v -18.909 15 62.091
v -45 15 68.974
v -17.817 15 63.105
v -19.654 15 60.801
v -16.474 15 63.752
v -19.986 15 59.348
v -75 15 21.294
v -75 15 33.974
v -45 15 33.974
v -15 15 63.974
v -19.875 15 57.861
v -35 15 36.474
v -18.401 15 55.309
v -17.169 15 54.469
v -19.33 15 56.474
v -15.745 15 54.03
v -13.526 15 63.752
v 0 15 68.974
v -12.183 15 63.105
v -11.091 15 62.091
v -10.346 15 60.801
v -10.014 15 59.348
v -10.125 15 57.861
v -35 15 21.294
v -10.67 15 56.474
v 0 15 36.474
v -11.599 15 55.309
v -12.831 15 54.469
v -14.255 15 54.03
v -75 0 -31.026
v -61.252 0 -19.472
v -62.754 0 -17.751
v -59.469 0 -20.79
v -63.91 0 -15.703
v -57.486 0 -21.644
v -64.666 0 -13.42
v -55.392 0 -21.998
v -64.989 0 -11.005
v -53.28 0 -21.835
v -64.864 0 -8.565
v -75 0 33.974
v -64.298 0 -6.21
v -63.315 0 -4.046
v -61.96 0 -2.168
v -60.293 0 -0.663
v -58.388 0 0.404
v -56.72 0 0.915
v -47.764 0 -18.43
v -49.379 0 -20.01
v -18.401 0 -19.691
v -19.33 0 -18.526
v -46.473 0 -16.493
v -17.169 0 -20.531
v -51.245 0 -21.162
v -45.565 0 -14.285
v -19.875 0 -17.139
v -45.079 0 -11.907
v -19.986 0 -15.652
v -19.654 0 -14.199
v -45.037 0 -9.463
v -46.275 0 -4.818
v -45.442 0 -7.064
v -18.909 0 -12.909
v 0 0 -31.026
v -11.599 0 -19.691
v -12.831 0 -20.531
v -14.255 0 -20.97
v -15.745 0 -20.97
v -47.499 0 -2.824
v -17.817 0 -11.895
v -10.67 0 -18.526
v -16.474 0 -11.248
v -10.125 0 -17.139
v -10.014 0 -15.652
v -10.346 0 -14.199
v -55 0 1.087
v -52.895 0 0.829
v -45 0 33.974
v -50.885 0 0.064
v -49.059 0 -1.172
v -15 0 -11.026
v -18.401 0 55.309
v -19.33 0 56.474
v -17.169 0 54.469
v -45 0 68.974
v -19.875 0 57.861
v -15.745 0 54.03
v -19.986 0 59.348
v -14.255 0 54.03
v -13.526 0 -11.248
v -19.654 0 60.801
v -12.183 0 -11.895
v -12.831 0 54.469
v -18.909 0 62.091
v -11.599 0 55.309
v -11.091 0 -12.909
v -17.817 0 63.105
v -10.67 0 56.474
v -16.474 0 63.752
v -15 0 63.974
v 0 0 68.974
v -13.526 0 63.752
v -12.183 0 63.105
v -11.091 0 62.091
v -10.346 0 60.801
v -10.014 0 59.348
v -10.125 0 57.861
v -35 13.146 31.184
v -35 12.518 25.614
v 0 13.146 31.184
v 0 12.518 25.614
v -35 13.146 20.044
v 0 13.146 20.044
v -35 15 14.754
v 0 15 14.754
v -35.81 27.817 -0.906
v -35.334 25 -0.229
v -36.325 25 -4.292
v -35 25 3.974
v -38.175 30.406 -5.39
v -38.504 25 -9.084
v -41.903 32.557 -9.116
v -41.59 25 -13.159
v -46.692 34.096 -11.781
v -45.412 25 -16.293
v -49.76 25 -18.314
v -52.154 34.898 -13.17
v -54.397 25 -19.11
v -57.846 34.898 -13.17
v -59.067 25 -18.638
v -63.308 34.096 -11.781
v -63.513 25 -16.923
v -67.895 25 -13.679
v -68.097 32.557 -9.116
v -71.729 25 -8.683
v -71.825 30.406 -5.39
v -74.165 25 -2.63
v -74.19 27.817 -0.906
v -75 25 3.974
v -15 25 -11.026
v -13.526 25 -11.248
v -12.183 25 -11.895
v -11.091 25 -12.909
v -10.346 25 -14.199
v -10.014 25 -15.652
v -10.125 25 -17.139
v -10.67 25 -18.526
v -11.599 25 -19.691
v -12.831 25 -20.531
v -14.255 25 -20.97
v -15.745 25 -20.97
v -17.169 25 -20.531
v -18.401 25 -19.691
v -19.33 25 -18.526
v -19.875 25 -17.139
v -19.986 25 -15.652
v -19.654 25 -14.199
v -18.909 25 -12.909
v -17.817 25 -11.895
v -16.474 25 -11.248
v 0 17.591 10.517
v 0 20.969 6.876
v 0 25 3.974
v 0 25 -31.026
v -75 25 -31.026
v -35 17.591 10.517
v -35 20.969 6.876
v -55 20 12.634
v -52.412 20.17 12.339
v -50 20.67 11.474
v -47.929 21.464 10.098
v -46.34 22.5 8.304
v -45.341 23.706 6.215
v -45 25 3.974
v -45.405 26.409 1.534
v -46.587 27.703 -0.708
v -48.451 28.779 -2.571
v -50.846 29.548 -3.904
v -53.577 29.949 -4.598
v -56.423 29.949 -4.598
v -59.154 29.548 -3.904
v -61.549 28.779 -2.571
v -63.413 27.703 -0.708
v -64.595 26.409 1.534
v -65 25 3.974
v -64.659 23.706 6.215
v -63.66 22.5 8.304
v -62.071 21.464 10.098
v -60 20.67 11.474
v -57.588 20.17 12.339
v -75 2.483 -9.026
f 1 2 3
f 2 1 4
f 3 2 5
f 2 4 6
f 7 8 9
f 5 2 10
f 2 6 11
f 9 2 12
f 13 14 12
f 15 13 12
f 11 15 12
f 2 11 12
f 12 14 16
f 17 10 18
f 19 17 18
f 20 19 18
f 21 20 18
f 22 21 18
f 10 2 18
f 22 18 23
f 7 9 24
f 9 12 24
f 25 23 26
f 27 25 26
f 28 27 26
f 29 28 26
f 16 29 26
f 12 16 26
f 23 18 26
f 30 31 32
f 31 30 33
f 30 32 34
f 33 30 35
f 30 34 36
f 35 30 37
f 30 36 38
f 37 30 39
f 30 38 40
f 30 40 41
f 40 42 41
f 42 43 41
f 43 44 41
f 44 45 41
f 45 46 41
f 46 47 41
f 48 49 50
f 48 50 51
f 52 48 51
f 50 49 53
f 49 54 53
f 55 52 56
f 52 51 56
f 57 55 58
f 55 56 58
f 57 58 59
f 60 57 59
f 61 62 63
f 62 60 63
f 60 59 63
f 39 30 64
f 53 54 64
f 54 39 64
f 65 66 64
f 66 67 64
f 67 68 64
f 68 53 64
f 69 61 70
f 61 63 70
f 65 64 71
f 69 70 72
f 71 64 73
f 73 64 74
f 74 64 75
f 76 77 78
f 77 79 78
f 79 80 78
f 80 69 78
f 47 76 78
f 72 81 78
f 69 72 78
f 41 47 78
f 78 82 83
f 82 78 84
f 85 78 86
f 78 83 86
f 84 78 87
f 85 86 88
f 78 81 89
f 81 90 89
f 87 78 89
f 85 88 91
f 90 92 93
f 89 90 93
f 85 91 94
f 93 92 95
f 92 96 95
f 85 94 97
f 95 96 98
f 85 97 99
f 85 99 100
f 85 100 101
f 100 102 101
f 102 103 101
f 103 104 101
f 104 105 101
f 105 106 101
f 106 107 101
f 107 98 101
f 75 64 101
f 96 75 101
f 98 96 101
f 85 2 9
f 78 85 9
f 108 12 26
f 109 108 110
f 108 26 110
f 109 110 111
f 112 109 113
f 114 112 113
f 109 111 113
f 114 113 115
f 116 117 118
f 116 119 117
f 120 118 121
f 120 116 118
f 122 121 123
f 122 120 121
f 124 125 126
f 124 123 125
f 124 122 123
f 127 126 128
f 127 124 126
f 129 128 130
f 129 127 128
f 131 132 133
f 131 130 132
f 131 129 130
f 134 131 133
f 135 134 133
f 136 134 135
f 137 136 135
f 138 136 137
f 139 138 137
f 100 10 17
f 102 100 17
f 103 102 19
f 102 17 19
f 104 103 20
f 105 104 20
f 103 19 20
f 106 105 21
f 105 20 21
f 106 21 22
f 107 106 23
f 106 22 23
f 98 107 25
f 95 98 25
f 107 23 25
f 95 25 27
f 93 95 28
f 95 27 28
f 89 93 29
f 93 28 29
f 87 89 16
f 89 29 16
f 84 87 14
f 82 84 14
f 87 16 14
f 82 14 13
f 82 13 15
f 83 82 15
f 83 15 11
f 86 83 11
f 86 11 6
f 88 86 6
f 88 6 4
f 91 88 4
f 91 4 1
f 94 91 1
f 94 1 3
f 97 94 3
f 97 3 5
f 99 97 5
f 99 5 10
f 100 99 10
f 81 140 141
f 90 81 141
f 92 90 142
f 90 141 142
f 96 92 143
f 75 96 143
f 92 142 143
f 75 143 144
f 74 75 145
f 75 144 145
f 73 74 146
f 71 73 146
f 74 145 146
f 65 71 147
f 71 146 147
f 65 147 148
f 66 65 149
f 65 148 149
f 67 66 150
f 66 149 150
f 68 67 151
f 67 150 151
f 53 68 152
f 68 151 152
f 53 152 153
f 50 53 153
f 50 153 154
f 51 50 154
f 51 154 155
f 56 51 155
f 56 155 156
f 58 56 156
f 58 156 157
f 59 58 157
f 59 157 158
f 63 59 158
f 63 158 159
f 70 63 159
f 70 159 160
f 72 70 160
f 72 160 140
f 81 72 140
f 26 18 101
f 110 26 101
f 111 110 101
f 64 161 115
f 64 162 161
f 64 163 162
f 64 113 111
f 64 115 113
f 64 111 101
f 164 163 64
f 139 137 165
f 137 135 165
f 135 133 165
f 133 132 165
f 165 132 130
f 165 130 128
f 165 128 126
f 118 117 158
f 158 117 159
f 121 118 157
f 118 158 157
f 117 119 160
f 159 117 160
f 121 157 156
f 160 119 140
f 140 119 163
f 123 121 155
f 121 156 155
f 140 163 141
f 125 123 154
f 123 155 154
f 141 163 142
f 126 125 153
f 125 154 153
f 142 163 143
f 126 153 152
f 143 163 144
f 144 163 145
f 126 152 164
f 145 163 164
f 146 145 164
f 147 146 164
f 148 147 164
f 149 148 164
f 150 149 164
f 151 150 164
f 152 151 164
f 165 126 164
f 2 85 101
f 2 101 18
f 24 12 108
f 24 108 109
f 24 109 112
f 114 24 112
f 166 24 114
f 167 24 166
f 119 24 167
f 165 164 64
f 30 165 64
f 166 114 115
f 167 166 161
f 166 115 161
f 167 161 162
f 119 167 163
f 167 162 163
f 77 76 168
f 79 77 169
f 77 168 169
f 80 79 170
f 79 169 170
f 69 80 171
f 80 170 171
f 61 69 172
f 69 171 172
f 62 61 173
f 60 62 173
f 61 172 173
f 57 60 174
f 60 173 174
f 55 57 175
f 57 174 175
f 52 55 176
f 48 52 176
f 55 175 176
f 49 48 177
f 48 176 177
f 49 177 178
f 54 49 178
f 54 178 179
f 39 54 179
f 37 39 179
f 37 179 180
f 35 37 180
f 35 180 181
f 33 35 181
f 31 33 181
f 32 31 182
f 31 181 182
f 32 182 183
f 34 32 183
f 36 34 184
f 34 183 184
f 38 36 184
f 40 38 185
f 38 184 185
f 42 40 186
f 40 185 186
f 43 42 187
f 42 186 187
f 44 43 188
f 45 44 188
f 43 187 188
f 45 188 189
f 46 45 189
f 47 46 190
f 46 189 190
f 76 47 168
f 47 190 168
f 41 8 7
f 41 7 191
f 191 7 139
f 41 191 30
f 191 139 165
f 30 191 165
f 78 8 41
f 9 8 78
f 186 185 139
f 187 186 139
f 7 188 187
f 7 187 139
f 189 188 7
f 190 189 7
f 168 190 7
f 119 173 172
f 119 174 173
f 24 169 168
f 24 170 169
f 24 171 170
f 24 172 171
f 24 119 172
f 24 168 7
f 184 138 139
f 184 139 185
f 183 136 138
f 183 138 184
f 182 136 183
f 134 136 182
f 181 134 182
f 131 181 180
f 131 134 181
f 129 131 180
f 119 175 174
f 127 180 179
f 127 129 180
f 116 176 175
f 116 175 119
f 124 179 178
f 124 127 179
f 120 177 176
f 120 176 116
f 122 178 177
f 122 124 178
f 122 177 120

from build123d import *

# Parameters (mm, degrees)
BOSS_EXTRUDE1_DEPTH = 75
SKETCH3_W           = 30
SKETCH3_H           = 35
CUT_EXTRUDE1_DEPTH  = 75
BOSS_EXTRUDE2_DEPTH = 40
BOSS_EXTRUDE3_DEPTH = 26
SKETCH6_R           = 10
CUT_EXTRUDE2_DEPTH  = 97.492272876
BOSS_EXTRUDE4_DEPTH = 37
CUT_EXTRUDE3_DEPTH  = 35
SKETCH9_R           = 5
CUT_EXTRUDE4_DEPTH  = 35


with BuildPart() as part:
    # Sketch2 → Boss-Extrude1 (new body)
    with BuildSketch(Plane(origin=(0, 0, 0), x_dir=(0, 0, -1), z_dir=(1, 0, 0))):
        Polygon((-68.973908168, 0), (-68.973908168, 15), (-3.973908168, 15), (-3.973908168, 25), (31.026091832, 25), (31.026091832, 0), align=None)
    extrude(amount=-BOSS_EXTRUDE1_DEPTH)

    # Sketch3 → Cut-Extrude1 (cut)
    with BuildSketch(Plane(origin=(0, 15, 0), x_dir=(1, 0, 0), z_dir=(0, 1, 0))):
        with Locations((-60, -51.473908168)):
            Rectangle(SKETCH3_W, SKETCH3_H)
    extrude(amount=-CUT_EXTRUDE1_DEPTH, mode=Mode.SUBTRACT)

    # Sketch4 → Boss-Extrude2 (add)
    with BuildSketch(Plane.ZY.offset(75)):
        Polygon((3.973908168, 25), (21.294416244, 15), (3.973908168, 15), align=None)
    extrude(amount=-BOSS_EXTRUDE2_DEPTH)

    # Sketch5 → Boss-Extrude3 (add)
    with BuildSketch(Plane(origin=(0, 20.470752713, 11.818794589), x_dir=(1, 0, 0), z_dir=(0, 0.866025403784438, 0.5000000000000012))):
        with BuildLine():
            Line((-75, 9.058494574), (-35, 9.058494574))
            ThreePointArc((-35, 9.058494574), (-55, 29.058494574), (-75, 9.058494574))
        make_face()
    extrude(amount=-BOSS_EXTRUDE3_DEPTH)

    # Sketch6 → Cut-Extrude2 (cut, through all)
    with BuildSketch(Plane(origin=(0, 20.470752713, 11.818794589), x_dir=(1, 0, 0), z_dir=(0, 0.866025403784438, 0.5000000000000012))):
        with Locations((-55, 9.058494574)):
            Circle(SKETCH6_R)
    extrude(amount=-CUT_EXTRUDE2_DEPTH, mode=Mode.SUBTRACT)

    # Sketch8 → Boss-Extrude4 (add)
    with BuildSketch(Plane(origin=(0, 0, 0), x_dir=(0, 0, -1), z_dir=(1, 0, 0))):
        Polygon((-3.973908168, 15), (-3.973908168, 25), (-21.294416244, 15), align=None)
    extrude(amount=-BOSS_EXTRUDE4_DEPTH)

    # Sketch8<3> → Cut-Extrude3 (cut)
    with BuildSketch(Plane(origin=(0, 0, 0), x_dir=(0, 0, -1), z_dir=(1, 0, 0))):
        with BuildLine():
            ThreePointArc((-36.473908168, 15), (-18.261943211, 13.623613889), (-3.973908168, 25))
            Line((-3.973908168, 25), (-21.294416244, 15))
            Line((-21.294416244, 15), (-36.473908168, 15))
        make_face()
    extrude(amount=-CUT_EXTRUDE3_DEPTH, mode=Mode.SUBTRACT)

    # Sketch9 → Cut-Extrude4 (cut)
    with BuildSketch(Plane(origin=(0, 25, 0), x_dir=(1, 0, 0), z_dir=(0, 1, 0))):
        with Locations((-15, 16.026091832)):
            Circle(SKETCH9_R)
        with Locations((-15, -58.973908168)):
            Circle(SKETCH9_R)
    extrude(amount=-CUT_EXTRUDE4_DEPTH, mode=Mode.SUBTRACT)


solid = part.part
